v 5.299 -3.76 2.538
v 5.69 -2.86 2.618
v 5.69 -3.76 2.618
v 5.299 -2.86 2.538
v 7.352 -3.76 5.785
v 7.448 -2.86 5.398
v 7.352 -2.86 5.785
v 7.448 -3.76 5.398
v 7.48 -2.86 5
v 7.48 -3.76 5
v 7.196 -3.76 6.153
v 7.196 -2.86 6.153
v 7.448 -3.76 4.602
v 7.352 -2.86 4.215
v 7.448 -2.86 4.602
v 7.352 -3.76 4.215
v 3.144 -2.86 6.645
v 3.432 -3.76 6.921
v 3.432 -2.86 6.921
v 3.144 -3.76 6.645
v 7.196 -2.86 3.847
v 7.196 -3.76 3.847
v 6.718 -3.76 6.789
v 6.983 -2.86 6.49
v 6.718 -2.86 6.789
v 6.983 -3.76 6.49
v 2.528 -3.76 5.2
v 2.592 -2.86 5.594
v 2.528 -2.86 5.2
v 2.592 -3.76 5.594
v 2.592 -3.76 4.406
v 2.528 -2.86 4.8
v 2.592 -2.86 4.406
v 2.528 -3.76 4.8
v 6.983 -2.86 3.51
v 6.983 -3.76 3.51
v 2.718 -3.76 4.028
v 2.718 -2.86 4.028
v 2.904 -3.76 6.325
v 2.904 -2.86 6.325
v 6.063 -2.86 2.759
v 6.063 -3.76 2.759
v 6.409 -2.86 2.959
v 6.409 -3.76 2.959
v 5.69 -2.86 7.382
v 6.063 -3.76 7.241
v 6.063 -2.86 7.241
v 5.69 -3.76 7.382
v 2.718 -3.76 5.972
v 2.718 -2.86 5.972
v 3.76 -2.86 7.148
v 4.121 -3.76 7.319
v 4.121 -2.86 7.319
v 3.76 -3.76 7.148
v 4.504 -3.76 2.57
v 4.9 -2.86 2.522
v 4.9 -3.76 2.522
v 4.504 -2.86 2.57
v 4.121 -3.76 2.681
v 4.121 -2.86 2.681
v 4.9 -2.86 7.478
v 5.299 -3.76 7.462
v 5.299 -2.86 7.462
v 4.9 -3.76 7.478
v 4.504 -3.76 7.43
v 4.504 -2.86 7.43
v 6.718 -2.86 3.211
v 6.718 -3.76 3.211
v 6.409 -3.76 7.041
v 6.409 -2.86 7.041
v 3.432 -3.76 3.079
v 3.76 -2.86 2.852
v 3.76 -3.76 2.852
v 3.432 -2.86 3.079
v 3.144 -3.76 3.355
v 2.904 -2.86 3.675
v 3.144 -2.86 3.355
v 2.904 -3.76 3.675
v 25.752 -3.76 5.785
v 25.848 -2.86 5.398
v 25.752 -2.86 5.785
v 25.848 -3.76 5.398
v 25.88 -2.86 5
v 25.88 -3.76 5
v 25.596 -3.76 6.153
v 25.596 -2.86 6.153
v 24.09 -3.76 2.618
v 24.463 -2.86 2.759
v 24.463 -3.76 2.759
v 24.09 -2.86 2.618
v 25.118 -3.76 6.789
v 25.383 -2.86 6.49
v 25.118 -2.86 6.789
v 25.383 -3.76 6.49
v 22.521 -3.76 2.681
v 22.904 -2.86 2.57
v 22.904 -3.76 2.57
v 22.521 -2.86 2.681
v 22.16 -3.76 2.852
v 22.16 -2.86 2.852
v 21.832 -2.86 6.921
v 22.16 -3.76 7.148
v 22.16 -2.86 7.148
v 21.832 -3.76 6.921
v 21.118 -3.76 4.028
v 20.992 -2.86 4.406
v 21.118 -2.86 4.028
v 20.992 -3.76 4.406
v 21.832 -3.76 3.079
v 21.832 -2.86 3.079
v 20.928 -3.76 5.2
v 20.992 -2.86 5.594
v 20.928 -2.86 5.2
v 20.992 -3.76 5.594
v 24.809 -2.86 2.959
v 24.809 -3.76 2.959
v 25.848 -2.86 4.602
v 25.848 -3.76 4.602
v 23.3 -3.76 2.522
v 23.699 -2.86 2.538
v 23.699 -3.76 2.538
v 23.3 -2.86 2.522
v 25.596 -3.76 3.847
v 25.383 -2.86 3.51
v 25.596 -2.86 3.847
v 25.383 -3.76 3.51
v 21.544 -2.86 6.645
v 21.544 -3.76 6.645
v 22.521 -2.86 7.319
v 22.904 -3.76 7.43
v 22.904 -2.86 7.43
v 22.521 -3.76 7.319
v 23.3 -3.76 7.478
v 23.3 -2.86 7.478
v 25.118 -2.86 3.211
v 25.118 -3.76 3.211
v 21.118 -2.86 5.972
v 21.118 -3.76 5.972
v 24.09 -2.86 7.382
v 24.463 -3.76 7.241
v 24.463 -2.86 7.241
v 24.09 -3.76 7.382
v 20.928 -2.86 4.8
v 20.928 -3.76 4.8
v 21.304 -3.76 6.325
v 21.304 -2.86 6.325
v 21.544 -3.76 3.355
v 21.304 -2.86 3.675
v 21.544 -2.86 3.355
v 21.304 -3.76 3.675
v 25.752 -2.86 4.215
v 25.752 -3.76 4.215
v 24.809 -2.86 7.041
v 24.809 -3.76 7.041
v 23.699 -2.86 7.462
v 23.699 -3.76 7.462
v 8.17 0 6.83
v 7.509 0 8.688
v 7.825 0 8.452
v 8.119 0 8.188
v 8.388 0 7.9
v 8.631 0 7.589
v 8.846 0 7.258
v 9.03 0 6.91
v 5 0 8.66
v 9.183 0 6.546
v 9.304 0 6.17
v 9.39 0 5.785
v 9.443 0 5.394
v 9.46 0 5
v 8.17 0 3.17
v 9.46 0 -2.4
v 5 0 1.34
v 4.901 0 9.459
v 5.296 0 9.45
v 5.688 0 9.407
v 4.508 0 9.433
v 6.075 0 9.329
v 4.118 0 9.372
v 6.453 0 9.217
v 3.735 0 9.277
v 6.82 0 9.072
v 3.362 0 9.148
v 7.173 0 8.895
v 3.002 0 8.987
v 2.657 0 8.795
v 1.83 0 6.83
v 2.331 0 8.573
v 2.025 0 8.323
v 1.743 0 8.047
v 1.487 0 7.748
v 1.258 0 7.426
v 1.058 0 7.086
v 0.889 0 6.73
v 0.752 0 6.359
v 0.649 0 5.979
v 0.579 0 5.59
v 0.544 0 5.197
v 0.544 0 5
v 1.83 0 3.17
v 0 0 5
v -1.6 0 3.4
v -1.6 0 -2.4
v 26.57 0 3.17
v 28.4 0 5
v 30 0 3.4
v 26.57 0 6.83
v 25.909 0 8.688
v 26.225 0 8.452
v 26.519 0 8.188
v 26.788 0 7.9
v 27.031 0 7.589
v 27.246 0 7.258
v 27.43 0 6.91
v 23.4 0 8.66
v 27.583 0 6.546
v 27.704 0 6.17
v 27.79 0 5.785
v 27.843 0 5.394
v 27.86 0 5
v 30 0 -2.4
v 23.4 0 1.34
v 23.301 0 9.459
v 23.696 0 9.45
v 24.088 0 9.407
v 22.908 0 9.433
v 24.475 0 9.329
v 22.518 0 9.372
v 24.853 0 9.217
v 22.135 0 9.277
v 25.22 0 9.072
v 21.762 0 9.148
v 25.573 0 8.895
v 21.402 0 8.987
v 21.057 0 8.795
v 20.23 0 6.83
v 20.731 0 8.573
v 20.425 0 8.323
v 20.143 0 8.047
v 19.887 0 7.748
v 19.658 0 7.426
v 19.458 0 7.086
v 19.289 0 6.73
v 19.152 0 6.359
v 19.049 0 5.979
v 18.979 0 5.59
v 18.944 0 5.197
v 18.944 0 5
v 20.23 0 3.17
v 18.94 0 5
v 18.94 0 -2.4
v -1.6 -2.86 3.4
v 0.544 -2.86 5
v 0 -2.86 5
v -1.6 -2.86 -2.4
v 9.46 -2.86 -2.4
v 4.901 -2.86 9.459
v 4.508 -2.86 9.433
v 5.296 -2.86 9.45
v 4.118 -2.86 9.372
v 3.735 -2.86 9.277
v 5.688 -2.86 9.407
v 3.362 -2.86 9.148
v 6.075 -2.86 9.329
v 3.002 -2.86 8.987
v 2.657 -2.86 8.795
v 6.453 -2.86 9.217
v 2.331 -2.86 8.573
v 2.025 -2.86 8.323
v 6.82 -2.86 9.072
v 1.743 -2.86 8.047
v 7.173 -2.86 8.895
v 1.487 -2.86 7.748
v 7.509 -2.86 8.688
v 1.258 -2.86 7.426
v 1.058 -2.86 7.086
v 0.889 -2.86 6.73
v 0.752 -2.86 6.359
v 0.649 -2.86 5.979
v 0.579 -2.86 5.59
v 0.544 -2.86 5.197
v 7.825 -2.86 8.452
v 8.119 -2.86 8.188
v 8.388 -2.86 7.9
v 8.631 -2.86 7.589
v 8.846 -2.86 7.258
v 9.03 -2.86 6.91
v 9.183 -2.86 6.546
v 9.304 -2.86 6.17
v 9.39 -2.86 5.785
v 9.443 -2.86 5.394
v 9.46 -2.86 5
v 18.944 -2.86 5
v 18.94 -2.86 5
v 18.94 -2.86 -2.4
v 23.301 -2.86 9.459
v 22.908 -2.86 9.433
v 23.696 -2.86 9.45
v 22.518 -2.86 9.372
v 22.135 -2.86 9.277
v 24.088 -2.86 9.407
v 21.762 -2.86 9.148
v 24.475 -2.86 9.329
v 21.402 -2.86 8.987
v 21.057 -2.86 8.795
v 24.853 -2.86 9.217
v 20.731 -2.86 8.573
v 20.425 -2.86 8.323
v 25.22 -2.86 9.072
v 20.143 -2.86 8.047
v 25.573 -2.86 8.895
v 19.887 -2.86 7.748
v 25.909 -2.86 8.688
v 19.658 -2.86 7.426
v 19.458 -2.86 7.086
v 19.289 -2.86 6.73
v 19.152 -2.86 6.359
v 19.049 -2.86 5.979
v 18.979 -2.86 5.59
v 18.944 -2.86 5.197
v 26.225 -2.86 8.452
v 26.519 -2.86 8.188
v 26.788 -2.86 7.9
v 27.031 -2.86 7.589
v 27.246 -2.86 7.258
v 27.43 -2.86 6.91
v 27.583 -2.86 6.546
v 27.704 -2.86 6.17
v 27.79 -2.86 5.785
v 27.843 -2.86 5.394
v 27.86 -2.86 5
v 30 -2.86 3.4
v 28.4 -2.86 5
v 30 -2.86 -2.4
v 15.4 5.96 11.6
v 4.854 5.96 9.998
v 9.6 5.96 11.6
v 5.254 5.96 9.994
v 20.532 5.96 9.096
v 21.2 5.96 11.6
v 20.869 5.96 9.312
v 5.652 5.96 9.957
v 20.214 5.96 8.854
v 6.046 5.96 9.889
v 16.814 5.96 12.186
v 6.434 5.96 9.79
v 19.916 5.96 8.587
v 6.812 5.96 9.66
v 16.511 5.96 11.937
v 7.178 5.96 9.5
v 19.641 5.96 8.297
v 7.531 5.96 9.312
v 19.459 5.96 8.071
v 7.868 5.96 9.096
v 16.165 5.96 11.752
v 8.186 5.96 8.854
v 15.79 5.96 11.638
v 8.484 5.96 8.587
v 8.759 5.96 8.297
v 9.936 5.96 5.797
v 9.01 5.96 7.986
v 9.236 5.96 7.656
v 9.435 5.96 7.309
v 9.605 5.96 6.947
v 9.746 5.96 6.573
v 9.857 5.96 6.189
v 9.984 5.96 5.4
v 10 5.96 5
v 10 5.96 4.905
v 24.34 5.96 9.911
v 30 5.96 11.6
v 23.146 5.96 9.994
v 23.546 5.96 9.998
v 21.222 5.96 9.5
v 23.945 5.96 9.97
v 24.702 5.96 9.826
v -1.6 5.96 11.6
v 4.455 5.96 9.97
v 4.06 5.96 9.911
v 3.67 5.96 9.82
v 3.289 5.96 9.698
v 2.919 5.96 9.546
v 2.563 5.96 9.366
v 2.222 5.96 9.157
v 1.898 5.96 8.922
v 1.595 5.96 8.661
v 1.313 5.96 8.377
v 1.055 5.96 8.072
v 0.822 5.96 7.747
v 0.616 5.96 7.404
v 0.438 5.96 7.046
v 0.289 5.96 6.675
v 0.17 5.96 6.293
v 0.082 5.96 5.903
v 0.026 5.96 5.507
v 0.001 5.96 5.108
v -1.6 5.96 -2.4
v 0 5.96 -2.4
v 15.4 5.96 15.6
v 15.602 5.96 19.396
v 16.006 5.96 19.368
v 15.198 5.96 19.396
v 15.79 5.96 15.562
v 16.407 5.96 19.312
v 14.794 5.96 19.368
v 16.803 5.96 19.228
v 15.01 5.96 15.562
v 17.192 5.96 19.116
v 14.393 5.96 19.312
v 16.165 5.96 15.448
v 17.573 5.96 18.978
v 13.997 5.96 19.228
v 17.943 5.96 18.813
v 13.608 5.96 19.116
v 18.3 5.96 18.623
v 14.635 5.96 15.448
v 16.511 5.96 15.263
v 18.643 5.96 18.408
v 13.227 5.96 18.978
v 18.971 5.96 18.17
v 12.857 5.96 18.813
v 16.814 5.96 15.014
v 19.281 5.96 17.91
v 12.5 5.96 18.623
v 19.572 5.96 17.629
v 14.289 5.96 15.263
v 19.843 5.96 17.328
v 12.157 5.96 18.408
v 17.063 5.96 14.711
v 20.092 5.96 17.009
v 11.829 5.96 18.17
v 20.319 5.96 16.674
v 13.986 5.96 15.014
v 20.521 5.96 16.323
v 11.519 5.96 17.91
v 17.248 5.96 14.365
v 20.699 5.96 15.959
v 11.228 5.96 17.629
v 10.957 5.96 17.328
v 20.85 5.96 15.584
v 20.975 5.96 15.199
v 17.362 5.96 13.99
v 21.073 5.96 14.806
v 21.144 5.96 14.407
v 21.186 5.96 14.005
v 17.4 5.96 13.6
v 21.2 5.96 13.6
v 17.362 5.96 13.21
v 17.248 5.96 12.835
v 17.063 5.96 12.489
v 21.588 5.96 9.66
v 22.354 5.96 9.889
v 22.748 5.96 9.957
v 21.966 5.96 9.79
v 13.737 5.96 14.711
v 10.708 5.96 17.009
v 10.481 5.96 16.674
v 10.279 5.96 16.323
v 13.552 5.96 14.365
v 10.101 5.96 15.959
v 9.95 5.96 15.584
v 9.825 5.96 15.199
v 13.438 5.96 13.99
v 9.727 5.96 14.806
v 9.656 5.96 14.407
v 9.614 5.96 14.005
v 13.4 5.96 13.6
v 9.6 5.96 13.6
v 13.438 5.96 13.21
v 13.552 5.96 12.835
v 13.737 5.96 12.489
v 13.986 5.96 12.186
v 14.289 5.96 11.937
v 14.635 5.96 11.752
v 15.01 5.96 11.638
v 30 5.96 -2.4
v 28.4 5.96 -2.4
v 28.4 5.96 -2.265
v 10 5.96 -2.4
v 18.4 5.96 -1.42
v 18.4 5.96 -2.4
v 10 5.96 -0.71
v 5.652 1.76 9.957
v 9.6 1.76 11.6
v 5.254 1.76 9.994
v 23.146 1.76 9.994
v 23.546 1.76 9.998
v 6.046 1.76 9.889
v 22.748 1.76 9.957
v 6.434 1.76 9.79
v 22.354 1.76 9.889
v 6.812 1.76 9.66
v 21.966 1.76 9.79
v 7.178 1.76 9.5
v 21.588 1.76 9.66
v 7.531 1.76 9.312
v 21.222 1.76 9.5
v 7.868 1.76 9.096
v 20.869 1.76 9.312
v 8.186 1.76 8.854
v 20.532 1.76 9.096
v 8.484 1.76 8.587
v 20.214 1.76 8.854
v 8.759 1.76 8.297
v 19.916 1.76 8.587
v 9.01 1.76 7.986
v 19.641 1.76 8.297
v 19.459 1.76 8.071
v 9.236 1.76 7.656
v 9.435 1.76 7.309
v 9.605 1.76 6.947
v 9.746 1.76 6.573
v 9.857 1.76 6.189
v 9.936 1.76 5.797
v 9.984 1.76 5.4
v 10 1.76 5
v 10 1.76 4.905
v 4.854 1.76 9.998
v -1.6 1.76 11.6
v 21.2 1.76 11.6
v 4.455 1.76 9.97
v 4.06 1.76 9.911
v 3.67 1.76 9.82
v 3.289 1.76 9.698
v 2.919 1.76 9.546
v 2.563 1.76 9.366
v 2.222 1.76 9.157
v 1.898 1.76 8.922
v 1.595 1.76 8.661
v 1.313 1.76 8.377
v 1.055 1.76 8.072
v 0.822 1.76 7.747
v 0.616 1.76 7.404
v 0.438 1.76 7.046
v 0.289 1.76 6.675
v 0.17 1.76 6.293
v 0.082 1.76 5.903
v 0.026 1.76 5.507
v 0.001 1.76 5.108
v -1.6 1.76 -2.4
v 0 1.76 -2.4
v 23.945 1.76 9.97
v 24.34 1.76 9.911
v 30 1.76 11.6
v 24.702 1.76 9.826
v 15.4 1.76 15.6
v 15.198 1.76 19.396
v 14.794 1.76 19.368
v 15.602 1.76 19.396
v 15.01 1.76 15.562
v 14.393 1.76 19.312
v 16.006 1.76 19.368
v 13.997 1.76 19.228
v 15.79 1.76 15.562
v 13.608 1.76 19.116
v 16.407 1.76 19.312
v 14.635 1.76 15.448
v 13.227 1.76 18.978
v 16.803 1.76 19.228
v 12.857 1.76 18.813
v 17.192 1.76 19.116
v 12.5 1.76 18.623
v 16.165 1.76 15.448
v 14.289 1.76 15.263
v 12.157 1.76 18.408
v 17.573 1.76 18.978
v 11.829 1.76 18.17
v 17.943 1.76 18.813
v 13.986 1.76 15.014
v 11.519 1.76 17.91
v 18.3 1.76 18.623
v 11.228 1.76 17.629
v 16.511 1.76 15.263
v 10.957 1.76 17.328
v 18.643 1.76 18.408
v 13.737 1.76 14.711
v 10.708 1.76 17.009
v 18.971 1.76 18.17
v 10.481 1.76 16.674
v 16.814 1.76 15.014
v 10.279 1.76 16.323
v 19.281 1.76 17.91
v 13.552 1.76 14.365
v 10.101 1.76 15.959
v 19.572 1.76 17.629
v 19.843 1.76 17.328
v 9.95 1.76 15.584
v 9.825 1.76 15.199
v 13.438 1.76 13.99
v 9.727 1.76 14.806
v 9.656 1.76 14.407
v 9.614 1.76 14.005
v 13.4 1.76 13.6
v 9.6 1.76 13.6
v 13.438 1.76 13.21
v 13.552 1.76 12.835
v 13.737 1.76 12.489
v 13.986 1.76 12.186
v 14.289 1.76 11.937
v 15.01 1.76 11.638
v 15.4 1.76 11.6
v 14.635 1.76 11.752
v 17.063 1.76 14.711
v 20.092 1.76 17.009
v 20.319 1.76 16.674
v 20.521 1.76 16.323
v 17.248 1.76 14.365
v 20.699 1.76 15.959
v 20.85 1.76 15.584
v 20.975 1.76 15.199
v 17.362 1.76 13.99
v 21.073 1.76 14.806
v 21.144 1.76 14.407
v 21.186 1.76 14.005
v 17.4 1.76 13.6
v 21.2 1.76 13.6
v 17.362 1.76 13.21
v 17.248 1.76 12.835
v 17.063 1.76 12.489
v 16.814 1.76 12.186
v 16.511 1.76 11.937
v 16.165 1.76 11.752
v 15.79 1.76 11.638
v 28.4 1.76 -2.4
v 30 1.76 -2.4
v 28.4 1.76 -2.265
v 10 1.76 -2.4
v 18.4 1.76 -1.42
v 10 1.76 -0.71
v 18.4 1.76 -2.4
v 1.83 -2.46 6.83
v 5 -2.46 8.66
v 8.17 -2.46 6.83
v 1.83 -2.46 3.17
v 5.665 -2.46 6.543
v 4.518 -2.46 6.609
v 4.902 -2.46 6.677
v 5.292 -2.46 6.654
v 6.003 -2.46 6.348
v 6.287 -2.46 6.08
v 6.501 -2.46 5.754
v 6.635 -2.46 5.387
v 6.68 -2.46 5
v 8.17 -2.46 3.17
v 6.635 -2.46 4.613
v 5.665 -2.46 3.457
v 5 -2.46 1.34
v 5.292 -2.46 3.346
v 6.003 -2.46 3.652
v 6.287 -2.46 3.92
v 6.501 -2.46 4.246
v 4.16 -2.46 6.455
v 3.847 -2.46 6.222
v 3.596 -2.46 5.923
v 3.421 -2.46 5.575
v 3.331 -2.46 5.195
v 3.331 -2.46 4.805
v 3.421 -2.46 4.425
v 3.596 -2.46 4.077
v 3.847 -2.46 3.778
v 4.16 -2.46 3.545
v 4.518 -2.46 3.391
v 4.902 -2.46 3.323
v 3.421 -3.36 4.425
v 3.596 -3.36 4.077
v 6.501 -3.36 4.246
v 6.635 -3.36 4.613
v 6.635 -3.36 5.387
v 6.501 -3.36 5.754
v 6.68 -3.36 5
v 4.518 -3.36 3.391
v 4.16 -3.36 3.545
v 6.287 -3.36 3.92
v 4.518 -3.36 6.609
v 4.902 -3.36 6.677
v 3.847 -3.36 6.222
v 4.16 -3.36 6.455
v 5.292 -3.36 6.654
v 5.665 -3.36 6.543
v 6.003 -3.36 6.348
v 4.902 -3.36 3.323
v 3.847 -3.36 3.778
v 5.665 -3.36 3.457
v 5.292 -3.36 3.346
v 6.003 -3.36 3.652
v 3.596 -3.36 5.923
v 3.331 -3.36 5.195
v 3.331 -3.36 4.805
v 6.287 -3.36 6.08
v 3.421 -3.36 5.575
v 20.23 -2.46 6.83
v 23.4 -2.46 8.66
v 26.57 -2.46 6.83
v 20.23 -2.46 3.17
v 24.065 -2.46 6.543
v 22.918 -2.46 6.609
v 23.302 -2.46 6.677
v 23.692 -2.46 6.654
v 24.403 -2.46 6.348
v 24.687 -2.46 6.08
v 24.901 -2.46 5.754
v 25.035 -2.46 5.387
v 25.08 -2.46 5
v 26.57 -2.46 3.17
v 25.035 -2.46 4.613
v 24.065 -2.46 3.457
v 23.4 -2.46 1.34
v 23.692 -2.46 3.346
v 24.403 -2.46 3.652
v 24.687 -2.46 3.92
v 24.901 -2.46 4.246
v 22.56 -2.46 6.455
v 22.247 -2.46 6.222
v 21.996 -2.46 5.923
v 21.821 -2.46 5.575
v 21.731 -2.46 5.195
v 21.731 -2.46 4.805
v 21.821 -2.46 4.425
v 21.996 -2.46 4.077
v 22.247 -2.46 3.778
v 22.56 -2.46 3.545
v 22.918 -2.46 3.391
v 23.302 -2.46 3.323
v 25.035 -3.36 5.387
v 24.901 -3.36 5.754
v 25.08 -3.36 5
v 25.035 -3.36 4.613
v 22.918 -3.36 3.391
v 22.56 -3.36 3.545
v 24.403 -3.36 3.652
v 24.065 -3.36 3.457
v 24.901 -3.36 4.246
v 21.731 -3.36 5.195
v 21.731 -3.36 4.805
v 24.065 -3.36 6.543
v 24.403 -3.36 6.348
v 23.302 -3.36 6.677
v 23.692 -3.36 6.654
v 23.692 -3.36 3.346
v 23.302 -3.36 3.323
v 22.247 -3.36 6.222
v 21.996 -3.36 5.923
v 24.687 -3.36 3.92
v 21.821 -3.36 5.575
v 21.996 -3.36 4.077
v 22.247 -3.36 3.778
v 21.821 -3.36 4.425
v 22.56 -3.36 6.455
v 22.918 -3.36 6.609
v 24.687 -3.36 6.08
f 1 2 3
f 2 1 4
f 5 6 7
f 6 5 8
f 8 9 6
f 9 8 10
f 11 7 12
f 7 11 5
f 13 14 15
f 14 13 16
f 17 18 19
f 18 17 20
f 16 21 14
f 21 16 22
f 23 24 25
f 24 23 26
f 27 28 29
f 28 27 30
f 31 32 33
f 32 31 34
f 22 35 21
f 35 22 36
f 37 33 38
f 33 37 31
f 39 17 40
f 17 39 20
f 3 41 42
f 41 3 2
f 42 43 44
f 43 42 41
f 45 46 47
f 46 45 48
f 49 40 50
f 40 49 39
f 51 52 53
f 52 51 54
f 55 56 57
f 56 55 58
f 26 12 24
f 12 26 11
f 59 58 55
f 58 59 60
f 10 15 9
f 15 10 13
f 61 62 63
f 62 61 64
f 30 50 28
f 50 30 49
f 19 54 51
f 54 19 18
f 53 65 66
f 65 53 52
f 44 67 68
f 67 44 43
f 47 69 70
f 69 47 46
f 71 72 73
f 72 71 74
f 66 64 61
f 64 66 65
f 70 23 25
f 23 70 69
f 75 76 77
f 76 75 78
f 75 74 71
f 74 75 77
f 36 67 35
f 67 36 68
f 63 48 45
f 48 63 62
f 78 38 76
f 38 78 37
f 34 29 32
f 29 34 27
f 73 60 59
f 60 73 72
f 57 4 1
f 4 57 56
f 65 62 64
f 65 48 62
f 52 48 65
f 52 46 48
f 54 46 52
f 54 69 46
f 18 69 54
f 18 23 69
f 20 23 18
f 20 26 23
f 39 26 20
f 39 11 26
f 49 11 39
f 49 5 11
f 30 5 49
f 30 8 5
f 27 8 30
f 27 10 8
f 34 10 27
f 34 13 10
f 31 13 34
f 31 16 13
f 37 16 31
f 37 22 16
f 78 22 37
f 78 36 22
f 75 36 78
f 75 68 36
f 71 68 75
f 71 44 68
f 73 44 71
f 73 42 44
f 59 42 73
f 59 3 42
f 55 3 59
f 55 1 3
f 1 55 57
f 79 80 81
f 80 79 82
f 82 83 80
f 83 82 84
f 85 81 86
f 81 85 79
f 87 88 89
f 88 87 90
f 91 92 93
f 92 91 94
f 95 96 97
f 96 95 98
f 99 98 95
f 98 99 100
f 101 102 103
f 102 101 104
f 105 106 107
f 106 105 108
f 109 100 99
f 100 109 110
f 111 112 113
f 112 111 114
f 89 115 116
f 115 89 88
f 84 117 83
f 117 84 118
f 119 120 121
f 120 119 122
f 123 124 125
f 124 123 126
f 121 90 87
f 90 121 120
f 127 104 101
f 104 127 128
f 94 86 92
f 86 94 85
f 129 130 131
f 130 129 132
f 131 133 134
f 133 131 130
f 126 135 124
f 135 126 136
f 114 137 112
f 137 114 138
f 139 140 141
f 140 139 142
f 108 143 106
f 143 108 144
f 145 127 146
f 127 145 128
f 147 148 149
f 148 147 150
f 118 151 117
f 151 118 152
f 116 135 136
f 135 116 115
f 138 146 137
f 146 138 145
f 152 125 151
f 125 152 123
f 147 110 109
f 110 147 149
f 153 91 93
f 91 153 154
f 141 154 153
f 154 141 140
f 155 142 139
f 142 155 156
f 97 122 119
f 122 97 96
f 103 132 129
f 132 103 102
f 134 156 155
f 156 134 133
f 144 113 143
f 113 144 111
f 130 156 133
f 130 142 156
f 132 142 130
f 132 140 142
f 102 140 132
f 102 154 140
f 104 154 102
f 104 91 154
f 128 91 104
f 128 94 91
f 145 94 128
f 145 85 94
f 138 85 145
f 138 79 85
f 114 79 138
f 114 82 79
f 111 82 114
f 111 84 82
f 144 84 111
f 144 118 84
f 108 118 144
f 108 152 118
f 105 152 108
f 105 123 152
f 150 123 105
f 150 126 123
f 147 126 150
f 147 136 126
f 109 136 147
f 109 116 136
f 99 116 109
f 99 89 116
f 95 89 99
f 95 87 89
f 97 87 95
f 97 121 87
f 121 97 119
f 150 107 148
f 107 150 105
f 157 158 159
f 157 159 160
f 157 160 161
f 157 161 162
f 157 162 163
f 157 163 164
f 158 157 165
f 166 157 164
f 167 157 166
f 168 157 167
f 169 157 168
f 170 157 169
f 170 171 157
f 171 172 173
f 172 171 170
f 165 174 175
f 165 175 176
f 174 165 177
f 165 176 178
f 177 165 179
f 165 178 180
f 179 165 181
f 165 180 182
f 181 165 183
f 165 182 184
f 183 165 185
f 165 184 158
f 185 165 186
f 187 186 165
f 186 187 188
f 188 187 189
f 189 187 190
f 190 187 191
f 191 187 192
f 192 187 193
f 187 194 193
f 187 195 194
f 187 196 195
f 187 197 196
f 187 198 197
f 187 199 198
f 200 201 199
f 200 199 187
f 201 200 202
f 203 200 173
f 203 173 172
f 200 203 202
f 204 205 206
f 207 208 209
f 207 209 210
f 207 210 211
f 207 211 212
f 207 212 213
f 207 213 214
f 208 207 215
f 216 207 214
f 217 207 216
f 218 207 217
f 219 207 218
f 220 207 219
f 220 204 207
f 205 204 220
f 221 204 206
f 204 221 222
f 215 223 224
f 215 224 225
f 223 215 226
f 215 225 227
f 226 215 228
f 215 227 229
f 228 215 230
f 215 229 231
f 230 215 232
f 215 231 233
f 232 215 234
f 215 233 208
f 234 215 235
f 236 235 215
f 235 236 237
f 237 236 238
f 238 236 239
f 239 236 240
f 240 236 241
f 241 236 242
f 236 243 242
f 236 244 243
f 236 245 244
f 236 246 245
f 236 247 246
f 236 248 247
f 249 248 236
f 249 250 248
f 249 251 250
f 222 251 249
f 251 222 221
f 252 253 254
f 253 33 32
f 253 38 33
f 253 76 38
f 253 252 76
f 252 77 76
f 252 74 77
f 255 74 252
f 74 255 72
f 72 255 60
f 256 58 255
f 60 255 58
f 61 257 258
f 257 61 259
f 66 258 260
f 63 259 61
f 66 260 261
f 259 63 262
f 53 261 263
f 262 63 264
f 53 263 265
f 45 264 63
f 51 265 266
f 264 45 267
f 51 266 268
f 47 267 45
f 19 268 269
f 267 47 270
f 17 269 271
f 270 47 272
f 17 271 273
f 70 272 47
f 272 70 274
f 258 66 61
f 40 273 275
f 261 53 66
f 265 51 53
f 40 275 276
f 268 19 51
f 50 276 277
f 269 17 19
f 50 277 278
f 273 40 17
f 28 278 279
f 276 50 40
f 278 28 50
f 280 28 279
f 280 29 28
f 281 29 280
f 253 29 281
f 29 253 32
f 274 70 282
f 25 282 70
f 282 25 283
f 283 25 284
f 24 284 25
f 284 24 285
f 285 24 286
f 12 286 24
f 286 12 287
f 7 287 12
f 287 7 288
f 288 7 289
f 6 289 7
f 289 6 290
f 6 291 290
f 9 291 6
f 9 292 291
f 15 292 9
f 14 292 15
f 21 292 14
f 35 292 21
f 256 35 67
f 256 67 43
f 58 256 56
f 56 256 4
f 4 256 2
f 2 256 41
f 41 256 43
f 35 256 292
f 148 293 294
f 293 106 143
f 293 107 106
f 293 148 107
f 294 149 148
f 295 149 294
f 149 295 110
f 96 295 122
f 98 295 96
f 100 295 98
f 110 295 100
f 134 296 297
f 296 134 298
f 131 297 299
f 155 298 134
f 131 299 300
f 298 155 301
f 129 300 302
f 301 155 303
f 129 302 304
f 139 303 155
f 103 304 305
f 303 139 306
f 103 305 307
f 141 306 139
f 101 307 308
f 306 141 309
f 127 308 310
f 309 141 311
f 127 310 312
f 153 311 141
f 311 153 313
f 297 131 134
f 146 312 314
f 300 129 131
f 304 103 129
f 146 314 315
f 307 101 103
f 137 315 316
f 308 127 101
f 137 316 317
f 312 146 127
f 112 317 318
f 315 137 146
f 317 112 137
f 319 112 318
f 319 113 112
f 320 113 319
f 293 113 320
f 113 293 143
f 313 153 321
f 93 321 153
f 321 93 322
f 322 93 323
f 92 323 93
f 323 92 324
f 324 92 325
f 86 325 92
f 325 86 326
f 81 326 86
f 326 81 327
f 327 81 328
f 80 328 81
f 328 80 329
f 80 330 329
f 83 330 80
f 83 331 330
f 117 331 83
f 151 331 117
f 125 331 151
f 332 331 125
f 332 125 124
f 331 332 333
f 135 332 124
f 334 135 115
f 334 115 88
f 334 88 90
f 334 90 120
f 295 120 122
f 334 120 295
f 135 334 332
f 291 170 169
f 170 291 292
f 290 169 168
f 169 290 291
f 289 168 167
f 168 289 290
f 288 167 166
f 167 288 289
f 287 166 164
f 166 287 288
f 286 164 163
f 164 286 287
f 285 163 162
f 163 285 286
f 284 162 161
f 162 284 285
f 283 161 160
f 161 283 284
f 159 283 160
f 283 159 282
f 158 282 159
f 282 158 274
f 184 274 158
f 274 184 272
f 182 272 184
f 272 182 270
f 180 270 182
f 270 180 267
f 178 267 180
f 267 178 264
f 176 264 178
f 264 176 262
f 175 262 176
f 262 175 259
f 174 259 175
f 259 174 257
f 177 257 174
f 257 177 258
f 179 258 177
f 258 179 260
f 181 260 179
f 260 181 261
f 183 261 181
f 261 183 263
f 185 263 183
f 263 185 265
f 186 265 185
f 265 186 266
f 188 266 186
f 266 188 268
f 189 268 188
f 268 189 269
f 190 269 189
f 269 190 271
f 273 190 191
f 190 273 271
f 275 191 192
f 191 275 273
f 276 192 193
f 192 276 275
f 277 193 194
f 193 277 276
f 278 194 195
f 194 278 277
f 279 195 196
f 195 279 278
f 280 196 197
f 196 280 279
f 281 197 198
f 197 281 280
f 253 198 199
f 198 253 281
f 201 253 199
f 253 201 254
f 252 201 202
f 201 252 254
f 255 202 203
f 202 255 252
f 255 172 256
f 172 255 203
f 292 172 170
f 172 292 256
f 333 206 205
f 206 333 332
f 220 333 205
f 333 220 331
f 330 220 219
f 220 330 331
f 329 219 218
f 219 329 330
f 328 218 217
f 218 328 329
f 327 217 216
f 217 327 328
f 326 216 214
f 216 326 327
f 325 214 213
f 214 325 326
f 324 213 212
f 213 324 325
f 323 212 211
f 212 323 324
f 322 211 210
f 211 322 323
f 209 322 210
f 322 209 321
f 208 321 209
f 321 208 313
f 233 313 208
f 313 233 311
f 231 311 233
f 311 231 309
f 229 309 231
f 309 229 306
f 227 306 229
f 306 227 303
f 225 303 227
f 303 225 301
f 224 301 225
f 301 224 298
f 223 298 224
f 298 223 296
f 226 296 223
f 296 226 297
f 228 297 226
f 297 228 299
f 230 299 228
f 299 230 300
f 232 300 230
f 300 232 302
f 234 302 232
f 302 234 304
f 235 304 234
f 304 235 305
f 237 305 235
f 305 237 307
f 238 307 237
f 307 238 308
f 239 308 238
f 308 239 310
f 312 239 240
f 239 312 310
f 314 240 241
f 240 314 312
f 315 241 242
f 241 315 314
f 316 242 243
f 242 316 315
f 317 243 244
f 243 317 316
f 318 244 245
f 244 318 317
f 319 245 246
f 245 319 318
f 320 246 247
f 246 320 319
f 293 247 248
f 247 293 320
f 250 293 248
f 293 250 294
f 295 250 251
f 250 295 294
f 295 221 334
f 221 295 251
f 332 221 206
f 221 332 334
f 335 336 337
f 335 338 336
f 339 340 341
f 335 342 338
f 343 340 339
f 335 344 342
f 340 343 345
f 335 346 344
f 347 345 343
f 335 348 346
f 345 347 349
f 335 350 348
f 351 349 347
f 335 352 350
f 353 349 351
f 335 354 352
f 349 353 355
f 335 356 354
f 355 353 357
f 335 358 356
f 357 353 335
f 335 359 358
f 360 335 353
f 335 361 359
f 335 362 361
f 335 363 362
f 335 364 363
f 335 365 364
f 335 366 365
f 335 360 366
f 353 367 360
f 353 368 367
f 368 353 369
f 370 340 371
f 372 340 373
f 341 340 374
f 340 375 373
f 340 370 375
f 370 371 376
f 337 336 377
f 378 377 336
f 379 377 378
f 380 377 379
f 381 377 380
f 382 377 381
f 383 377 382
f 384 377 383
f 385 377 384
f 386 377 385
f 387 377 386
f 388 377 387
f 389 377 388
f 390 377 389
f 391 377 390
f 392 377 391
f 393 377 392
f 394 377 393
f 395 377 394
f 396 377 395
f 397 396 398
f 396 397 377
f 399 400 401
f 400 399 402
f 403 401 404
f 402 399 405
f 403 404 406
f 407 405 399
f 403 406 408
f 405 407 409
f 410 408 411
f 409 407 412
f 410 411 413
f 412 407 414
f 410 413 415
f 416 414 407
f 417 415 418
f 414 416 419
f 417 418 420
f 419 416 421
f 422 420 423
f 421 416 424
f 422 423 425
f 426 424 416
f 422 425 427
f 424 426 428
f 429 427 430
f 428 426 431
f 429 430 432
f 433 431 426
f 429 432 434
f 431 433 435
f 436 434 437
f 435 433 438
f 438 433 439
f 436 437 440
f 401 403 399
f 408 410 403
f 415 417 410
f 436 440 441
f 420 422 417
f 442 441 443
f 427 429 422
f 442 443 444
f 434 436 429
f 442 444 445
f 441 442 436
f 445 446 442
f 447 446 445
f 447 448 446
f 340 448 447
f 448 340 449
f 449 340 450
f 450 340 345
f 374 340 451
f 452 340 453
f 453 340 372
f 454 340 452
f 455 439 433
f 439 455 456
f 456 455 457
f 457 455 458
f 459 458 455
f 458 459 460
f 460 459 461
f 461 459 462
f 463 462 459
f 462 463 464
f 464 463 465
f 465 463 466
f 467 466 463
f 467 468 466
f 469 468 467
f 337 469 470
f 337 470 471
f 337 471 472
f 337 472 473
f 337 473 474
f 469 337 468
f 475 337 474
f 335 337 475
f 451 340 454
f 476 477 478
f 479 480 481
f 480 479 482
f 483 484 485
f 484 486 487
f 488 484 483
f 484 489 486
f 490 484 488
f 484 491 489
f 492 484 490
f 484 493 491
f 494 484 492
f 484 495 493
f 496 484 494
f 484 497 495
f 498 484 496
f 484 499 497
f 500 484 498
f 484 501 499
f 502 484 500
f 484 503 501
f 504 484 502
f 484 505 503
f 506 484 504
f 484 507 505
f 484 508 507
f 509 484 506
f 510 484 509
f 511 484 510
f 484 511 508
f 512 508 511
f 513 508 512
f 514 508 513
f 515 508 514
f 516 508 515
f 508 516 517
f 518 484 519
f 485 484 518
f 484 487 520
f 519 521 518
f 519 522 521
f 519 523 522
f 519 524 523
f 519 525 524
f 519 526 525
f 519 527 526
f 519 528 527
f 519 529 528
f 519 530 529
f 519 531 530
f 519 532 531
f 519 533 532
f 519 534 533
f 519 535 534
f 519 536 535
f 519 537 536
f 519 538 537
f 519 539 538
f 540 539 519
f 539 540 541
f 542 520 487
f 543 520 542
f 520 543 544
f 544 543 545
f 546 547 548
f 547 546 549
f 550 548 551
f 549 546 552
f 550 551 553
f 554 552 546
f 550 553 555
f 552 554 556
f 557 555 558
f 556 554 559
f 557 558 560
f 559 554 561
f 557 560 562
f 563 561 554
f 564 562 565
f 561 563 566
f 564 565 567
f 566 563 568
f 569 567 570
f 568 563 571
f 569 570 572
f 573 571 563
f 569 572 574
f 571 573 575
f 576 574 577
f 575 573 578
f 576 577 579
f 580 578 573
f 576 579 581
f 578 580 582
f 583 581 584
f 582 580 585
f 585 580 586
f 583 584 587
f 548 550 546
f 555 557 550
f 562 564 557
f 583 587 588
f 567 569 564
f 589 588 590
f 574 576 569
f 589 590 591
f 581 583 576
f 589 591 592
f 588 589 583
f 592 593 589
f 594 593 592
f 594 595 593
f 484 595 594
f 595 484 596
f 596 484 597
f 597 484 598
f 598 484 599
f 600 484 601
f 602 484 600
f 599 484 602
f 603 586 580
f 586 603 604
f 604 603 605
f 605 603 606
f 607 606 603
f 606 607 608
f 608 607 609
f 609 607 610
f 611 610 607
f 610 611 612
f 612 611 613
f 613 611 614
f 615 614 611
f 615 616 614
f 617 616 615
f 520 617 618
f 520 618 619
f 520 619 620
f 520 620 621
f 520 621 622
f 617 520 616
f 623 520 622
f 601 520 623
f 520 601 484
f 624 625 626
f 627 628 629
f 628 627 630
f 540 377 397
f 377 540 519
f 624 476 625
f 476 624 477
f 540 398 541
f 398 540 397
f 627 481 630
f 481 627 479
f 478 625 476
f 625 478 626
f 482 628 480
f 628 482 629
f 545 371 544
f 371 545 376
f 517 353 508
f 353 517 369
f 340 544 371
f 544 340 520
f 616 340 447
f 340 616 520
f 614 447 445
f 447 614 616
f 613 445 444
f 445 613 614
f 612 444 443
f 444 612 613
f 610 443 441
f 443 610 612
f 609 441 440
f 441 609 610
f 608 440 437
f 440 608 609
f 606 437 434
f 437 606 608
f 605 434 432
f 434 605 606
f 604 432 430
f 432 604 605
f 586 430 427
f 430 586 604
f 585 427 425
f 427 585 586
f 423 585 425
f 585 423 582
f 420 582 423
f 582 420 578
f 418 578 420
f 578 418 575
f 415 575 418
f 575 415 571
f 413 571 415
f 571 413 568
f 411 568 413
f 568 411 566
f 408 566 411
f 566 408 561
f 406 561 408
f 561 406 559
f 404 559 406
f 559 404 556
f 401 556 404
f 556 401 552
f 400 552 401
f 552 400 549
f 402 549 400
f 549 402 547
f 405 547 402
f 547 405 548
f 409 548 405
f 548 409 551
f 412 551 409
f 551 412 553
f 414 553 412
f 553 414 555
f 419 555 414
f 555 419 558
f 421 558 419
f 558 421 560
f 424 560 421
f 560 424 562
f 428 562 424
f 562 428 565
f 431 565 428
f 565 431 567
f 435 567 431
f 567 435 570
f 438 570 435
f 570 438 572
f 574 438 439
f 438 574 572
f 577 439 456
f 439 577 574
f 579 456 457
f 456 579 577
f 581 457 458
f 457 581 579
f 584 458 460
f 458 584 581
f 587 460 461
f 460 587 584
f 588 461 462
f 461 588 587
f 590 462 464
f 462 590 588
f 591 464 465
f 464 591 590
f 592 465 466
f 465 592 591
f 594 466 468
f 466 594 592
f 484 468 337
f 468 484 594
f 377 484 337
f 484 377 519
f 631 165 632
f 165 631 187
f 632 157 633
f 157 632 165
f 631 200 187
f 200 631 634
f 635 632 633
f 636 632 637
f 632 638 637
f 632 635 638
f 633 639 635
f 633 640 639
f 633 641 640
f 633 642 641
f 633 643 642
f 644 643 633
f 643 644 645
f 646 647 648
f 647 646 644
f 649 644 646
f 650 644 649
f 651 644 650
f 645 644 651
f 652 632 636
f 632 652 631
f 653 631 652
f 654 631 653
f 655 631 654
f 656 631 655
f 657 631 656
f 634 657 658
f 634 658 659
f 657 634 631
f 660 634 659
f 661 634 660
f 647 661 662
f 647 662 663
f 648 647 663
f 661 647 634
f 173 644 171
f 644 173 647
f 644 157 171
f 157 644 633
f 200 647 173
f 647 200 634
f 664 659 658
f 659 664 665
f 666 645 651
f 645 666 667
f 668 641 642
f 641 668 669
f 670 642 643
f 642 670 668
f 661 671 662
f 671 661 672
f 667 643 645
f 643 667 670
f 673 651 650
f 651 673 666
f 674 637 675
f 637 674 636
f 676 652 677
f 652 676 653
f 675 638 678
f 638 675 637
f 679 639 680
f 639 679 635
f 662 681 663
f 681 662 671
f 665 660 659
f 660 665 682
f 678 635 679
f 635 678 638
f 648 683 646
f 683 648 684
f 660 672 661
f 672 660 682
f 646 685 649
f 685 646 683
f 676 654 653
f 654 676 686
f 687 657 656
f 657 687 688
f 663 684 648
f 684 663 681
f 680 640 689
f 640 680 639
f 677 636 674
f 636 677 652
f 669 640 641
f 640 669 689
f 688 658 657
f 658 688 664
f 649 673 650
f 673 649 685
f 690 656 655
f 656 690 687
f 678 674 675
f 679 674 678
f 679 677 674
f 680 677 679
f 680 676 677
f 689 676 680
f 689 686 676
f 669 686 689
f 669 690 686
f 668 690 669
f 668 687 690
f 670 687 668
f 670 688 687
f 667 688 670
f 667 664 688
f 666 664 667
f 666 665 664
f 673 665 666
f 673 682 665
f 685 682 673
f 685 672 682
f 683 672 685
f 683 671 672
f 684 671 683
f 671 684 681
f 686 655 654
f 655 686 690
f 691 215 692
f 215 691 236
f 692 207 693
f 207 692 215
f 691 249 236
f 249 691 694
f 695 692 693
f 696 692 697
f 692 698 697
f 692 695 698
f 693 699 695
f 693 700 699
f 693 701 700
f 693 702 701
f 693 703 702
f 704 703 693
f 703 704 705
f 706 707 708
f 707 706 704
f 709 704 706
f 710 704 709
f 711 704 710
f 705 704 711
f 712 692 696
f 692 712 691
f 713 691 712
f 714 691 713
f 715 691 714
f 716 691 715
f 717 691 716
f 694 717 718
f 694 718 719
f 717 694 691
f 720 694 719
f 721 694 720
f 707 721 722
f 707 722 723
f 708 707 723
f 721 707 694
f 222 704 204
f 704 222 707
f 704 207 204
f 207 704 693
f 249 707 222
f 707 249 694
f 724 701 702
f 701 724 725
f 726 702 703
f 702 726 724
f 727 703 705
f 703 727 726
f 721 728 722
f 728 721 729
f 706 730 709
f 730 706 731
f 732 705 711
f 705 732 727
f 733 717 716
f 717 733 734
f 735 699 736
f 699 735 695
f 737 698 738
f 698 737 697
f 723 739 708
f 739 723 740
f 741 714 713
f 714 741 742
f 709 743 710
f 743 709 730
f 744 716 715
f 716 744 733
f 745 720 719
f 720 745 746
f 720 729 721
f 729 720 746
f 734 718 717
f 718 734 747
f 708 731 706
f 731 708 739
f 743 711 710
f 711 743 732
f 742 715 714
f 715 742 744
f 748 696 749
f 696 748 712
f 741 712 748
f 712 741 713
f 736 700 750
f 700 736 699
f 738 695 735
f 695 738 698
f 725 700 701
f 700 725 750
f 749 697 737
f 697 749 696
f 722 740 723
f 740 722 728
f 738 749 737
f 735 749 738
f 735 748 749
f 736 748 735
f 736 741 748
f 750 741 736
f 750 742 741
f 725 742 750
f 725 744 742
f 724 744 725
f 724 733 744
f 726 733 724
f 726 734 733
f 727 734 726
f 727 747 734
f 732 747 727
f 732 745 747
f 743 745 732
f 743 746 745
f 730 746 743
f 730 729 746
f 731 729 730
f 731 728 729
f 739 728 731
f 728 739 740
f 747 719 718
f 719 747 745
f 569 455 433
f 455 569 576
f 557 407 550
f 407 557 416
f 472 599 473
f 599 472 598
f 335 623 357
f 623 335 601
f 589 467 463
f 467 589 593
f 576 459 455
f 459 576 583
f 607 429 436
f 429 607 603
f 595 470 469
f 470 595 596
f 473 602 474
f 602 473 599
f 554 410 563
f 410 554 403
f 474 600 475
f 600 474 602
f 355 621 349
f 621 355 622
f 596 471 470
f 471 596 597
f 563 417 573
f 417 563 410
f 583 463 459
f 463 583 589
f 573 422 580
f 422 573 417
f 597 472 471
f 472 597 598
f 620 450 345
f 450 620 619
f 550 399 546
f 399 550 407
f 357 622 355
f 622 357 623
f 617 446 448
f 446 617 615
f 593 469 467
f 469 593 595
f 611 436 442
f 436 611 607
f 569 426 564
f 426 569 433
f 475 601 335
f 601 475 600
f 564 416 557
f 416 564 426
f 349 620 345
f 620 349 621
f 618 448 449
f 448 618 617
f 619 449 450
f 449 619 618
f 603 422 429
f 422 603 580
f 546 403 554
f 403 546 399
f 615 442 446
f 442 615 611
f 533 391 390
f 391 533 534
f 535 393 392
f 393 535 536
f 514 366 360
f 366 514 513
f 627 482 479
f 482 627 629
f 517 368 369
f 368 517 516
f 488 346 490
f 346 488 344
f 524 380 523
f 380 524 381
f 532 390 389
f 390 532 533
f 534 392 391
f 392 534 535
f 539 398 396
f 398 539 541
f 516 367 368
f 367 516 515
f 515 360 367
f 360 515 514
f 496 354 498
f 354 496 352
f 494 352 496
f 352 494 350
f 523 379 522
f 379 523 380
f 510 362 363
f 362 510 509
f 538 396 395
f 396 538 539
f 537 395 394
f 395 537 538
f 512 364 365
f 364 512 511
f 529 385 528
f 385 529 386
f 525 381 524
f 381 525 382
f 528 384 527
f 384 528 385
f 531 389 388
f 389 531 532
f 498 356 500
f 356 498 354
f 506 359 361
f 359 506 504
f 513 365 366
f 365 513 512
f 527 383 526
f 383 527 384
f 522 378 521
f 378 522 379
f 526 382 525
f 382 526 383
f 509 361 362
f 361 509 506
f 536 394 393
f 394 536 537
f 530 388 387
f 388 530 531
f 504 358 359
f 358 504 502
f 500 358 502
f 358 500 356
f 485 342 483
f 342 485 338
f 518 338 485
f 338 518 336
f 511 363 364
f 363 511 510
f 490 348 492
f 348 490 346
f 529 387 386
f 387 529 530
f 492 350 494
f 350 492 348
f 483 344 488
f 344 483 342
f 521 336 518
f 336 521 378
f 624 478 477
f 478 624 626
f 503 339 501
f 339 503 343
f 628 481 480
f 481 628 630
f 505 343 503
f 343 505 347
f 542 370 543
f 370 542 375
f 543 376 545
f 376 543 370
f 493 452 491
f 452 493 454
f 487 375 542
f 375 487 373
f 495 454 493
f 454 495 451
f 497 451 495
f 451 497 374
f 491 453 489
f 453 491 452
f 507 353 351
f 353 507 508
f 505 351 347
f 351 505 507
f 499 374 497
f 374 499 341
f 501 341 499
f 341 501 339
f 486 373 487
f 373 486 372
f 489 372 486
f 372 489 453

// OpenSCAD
// Copyright (C) 2025 Arif K. Rafiq
// This program is free software: you can redistribute it and/or modify
// it under the terms of the GNU General Public License as published by
// the Free Software Foundation, either version 3 of the License, or
// (at your option) any later version.

// This program is distributed in the hope that it will be useful,
// but WITHOUT ANY WARRANTY; without even the implied warranty of
// MERCHANTABILITY or FITNESS FOR A PARTICULAR PURPOSE.  See the
// GNU General Public License for more details.

// You should have received a copy of the GNU General Public License
// along with this file.  If not, see <https://www.gnu.org/licenses/>,
// or write to: license@temperedoptimism.com


/* 
(b)readth       :(w)est (X-)   (c)enter (X0) (e)east (X+)
(h)eight        :(d)own (Z-)   (g)round(Z0)  (u)p (Z+)

Vectors (v)     :(x), (y), (z)
Thicknesses (t) : Thicknesses to resolve 3D printer limits or rendering issues.
Proportion (p)  : container for grouping (r)adius and (i)ntensity into a singl 2d vector acccessed using .x and .y respectively
*/
/* 17:08 */
// Fixed in example3.scad       // Set limits in customizer
/* [Thicknesses (x),(y),(z)] */
tFitGap = [0.16, 0.16, 0.16];   //[0.00:0.01:0.64] 
tWallMin = [0.40, 0.40, 0.16];  //[0.16:0.08:1.60] 
/* [Proportional (x):(Radius, (y):(i)ntensity] */
pHexSink = [3.5, 2.3];          //[0.10:0.02:20.00] 
pFastShaft064 = [1.36, 5.80]; //0.10:0.02:20.00]
pFastShaft095 = [1.36, 9.30]; //0.10:0.02:20.00]
pWashSink = [4.00, 1.00]; //0.10:0.02:20.00]
/* [2D vectors (x), (y)] */
vTerminalW = [5.0, 5.0];     //[0.00:0.10:100] 
vTerminalE = [23.4, 5.0];    //[0.00:0.10:100]
vThermal = [ 15.4, 13.6];    //[0.00:0.10:100.00]
/* [Scalars] */
leadingEdge = 2.4; //[0.8:0.4:5.0]
flankEdge = 1.6; //[0.8:0.4:5.0]
trailingEdge = 1.6; //[0.8:0.4:3.6]
bBoard = 28.4; //[20:0.1:100.0]
hBoard = 1.6; //0.8:04:3.2]
// Adding space
hSpacer = 4.2; //[2.8:0.4:14]
rCorner = 1.6; //0.1
rTerminal = 5.0; //0.1
rThermal = 5.0;  //0.1
/* [Special ] */
fa0 = 4.0;     //[1:1:60]  
fs0 = 0.4;     //[0.1:0.1:4.0]  
fx0 = 3;       //[1,2,3,4,5,6,7,8,9,10]
/* [Hidden] */ 
tEps=0.01; 

/* Calucualted at run time. */
pHexSurround = [pHexSink.x + (tWallMin.x * 2) + tFitGap.x, pHexSink.y + tWallMin.y + tFitGap.y];
pExtension = [pFastShaft064.x + ((tWallMin.x + tFitGap.x)* 2), pFastShaft064.y + tWallMin.y + tFitGap.y - pHexSurround.y -hBoard - pWashSink.y];

//30.00-35.00 Circles, Also look at the customizer!!
// Rotate
rotate([90,0,0]){
  difference(){
    union() {
      // hex pocket surround
      linear_extrude(pHexSurround.y, convexity=fx0){ 
        polygon([[vTerminalW.x + pHexSurround.x, vTerminalW.y],
              [ vTerminalW.x + pHexSurround.x, -leadingEdge],
              [-flankEdge, -leadingEdge],
              [-flankEdge, vTerminalW.y - rCorner],
              [-flankEdge + rCorner, vTerminalW.y]]);
        polygon([[vTerminalE.x - pHexSurround.x, vTerminalE.y],
              [ vTerminalE.x - pHexSurround.x, -leadingEdge],
              [bBoard + flankEdge, -leadingEdge],
              [bBoard + flankEdge, vTerminalE.y - rCorner],
              [bBoard + flankEdge - rCorner, vTerminalE.y]]);       
              
        for(v = [vTerminalW, vTerminalE]){
          translate(v)  circle(pHexSurround.x, $fa=fa0, $fs=fs0 );
        }
      }
      // shaft extension
      for(v= [vTerminalW, vTerminalE]){
          translate([v.x, v.y, pHexSurround.y - tEps]) cylinder(pExtension.y + tEps, r=pExtension.x, $fa=fa0, $fs=fs0);
      }
      // board spacer
      translate([0, 0, -hBoard - tFitGap.y - hSpacer]) linear_extrude(hSpacer, convexity=fx0){
          polygon([[-flankEdge, -leadingEdge],
          [bBoard + flankEdge, -leadingEdge],
          for(a = [0:max(fa0,(fs0*360)/(2*PI*rCorner)):90]) [rCorner *cos(a), rCorner *sin(a)],
          [bBoard + flankEdge, vTerminalE.y + rTerminal + trailingEdge],
          [vThermal.x + rThermal +(tWallMin.x * 2), vTerminalE.y + rTerminal + trailingEdge],
          [vThermal.x + rThermal +(tWallMin.x * 2), vThermal.y],
          [vThermal.x - rThermal -(tWallMin.x * 2), vThermal.y],
          [vThermal.x - rThermal -(tWallMin.x * 2), vTerminalW.y + rTerminal + trailingEdge],
          [-flankEdge, vTerminalW.y + rTerminal + trailingEdge]]);
          translate(vThermal) circle(rThermal + (tWallMin.x * 2), $fa=fa0, $fs=fs0);
      }
          
    }
    for(v = [vTerminalW, vTerminalE]){
        // hex pocket
        #translate([v.x, v.y, -tEps]) rotate([0,0,30]) cylinder(pHexSurround.y - tWallMin.y + tEps, r=pHexSurround.x - (tWallMin.x * 2), $fn=6);
        // fastner hole
        #translate([v.x, v.y, -hBoard -pWashSink.y]) cylinder(pFastShaft064.y + tFitGap.y, r=pFastShaft064.x + (tFitGap.x * 2), $fa=fa0, $fs=fs0);
     
    }
   #translate([vThermal.x, vThermal.y, -hBoard + pWashSink.y]) rotate([0,180,0]) 
        cylinder(pFastShaft095.y + tFitGap.y, r=pFastShaft095.x + (tFitGap.x * 4), $fa=fa0, $fs=fs0);

    // terminal guide
   #translate([vTerminalW.x, vTerminalW.y, -hBoard - tFitGap.y -hSpacer -tEps ]) linear_extrude(hSpacer + (tEps *2), convexity=fx0) {
        polygon([for(a = [0:max(fa0, (fs0*360)/(2*PI*rTerminal)):180]) [rTerminal * cos(a), rTerminal *sin(a)]
        ,[-rTerminal, -vTerminalW.y -leadingEdge -tEps]
        ,[rTerminal, -vTerminalW.y -leadingEdge -tEps]]);
   }
   /* Mirror */
   #translate([vTerminalE.x, vTerminalE.y, -hBoard - tFitGap.y -hSpacer -tEps ]) linear_extrude(hSpacer + (tEps *2), convexity=fx0) {
        mirror([1,0,0]) 
        polygon([for(a = [0:max(fa0, (fs0*360)/(2*PI*rTerminal)):180]) [rTerminal * cos(a), rTerminal *sin(a)]
        ,[-rTerminal, -vTerminalW.y -leadingEdge -tEps]
        ,[rTerminal, -vTerminalW.y -leadingEdge -tEps]]);
   }
  }
}
